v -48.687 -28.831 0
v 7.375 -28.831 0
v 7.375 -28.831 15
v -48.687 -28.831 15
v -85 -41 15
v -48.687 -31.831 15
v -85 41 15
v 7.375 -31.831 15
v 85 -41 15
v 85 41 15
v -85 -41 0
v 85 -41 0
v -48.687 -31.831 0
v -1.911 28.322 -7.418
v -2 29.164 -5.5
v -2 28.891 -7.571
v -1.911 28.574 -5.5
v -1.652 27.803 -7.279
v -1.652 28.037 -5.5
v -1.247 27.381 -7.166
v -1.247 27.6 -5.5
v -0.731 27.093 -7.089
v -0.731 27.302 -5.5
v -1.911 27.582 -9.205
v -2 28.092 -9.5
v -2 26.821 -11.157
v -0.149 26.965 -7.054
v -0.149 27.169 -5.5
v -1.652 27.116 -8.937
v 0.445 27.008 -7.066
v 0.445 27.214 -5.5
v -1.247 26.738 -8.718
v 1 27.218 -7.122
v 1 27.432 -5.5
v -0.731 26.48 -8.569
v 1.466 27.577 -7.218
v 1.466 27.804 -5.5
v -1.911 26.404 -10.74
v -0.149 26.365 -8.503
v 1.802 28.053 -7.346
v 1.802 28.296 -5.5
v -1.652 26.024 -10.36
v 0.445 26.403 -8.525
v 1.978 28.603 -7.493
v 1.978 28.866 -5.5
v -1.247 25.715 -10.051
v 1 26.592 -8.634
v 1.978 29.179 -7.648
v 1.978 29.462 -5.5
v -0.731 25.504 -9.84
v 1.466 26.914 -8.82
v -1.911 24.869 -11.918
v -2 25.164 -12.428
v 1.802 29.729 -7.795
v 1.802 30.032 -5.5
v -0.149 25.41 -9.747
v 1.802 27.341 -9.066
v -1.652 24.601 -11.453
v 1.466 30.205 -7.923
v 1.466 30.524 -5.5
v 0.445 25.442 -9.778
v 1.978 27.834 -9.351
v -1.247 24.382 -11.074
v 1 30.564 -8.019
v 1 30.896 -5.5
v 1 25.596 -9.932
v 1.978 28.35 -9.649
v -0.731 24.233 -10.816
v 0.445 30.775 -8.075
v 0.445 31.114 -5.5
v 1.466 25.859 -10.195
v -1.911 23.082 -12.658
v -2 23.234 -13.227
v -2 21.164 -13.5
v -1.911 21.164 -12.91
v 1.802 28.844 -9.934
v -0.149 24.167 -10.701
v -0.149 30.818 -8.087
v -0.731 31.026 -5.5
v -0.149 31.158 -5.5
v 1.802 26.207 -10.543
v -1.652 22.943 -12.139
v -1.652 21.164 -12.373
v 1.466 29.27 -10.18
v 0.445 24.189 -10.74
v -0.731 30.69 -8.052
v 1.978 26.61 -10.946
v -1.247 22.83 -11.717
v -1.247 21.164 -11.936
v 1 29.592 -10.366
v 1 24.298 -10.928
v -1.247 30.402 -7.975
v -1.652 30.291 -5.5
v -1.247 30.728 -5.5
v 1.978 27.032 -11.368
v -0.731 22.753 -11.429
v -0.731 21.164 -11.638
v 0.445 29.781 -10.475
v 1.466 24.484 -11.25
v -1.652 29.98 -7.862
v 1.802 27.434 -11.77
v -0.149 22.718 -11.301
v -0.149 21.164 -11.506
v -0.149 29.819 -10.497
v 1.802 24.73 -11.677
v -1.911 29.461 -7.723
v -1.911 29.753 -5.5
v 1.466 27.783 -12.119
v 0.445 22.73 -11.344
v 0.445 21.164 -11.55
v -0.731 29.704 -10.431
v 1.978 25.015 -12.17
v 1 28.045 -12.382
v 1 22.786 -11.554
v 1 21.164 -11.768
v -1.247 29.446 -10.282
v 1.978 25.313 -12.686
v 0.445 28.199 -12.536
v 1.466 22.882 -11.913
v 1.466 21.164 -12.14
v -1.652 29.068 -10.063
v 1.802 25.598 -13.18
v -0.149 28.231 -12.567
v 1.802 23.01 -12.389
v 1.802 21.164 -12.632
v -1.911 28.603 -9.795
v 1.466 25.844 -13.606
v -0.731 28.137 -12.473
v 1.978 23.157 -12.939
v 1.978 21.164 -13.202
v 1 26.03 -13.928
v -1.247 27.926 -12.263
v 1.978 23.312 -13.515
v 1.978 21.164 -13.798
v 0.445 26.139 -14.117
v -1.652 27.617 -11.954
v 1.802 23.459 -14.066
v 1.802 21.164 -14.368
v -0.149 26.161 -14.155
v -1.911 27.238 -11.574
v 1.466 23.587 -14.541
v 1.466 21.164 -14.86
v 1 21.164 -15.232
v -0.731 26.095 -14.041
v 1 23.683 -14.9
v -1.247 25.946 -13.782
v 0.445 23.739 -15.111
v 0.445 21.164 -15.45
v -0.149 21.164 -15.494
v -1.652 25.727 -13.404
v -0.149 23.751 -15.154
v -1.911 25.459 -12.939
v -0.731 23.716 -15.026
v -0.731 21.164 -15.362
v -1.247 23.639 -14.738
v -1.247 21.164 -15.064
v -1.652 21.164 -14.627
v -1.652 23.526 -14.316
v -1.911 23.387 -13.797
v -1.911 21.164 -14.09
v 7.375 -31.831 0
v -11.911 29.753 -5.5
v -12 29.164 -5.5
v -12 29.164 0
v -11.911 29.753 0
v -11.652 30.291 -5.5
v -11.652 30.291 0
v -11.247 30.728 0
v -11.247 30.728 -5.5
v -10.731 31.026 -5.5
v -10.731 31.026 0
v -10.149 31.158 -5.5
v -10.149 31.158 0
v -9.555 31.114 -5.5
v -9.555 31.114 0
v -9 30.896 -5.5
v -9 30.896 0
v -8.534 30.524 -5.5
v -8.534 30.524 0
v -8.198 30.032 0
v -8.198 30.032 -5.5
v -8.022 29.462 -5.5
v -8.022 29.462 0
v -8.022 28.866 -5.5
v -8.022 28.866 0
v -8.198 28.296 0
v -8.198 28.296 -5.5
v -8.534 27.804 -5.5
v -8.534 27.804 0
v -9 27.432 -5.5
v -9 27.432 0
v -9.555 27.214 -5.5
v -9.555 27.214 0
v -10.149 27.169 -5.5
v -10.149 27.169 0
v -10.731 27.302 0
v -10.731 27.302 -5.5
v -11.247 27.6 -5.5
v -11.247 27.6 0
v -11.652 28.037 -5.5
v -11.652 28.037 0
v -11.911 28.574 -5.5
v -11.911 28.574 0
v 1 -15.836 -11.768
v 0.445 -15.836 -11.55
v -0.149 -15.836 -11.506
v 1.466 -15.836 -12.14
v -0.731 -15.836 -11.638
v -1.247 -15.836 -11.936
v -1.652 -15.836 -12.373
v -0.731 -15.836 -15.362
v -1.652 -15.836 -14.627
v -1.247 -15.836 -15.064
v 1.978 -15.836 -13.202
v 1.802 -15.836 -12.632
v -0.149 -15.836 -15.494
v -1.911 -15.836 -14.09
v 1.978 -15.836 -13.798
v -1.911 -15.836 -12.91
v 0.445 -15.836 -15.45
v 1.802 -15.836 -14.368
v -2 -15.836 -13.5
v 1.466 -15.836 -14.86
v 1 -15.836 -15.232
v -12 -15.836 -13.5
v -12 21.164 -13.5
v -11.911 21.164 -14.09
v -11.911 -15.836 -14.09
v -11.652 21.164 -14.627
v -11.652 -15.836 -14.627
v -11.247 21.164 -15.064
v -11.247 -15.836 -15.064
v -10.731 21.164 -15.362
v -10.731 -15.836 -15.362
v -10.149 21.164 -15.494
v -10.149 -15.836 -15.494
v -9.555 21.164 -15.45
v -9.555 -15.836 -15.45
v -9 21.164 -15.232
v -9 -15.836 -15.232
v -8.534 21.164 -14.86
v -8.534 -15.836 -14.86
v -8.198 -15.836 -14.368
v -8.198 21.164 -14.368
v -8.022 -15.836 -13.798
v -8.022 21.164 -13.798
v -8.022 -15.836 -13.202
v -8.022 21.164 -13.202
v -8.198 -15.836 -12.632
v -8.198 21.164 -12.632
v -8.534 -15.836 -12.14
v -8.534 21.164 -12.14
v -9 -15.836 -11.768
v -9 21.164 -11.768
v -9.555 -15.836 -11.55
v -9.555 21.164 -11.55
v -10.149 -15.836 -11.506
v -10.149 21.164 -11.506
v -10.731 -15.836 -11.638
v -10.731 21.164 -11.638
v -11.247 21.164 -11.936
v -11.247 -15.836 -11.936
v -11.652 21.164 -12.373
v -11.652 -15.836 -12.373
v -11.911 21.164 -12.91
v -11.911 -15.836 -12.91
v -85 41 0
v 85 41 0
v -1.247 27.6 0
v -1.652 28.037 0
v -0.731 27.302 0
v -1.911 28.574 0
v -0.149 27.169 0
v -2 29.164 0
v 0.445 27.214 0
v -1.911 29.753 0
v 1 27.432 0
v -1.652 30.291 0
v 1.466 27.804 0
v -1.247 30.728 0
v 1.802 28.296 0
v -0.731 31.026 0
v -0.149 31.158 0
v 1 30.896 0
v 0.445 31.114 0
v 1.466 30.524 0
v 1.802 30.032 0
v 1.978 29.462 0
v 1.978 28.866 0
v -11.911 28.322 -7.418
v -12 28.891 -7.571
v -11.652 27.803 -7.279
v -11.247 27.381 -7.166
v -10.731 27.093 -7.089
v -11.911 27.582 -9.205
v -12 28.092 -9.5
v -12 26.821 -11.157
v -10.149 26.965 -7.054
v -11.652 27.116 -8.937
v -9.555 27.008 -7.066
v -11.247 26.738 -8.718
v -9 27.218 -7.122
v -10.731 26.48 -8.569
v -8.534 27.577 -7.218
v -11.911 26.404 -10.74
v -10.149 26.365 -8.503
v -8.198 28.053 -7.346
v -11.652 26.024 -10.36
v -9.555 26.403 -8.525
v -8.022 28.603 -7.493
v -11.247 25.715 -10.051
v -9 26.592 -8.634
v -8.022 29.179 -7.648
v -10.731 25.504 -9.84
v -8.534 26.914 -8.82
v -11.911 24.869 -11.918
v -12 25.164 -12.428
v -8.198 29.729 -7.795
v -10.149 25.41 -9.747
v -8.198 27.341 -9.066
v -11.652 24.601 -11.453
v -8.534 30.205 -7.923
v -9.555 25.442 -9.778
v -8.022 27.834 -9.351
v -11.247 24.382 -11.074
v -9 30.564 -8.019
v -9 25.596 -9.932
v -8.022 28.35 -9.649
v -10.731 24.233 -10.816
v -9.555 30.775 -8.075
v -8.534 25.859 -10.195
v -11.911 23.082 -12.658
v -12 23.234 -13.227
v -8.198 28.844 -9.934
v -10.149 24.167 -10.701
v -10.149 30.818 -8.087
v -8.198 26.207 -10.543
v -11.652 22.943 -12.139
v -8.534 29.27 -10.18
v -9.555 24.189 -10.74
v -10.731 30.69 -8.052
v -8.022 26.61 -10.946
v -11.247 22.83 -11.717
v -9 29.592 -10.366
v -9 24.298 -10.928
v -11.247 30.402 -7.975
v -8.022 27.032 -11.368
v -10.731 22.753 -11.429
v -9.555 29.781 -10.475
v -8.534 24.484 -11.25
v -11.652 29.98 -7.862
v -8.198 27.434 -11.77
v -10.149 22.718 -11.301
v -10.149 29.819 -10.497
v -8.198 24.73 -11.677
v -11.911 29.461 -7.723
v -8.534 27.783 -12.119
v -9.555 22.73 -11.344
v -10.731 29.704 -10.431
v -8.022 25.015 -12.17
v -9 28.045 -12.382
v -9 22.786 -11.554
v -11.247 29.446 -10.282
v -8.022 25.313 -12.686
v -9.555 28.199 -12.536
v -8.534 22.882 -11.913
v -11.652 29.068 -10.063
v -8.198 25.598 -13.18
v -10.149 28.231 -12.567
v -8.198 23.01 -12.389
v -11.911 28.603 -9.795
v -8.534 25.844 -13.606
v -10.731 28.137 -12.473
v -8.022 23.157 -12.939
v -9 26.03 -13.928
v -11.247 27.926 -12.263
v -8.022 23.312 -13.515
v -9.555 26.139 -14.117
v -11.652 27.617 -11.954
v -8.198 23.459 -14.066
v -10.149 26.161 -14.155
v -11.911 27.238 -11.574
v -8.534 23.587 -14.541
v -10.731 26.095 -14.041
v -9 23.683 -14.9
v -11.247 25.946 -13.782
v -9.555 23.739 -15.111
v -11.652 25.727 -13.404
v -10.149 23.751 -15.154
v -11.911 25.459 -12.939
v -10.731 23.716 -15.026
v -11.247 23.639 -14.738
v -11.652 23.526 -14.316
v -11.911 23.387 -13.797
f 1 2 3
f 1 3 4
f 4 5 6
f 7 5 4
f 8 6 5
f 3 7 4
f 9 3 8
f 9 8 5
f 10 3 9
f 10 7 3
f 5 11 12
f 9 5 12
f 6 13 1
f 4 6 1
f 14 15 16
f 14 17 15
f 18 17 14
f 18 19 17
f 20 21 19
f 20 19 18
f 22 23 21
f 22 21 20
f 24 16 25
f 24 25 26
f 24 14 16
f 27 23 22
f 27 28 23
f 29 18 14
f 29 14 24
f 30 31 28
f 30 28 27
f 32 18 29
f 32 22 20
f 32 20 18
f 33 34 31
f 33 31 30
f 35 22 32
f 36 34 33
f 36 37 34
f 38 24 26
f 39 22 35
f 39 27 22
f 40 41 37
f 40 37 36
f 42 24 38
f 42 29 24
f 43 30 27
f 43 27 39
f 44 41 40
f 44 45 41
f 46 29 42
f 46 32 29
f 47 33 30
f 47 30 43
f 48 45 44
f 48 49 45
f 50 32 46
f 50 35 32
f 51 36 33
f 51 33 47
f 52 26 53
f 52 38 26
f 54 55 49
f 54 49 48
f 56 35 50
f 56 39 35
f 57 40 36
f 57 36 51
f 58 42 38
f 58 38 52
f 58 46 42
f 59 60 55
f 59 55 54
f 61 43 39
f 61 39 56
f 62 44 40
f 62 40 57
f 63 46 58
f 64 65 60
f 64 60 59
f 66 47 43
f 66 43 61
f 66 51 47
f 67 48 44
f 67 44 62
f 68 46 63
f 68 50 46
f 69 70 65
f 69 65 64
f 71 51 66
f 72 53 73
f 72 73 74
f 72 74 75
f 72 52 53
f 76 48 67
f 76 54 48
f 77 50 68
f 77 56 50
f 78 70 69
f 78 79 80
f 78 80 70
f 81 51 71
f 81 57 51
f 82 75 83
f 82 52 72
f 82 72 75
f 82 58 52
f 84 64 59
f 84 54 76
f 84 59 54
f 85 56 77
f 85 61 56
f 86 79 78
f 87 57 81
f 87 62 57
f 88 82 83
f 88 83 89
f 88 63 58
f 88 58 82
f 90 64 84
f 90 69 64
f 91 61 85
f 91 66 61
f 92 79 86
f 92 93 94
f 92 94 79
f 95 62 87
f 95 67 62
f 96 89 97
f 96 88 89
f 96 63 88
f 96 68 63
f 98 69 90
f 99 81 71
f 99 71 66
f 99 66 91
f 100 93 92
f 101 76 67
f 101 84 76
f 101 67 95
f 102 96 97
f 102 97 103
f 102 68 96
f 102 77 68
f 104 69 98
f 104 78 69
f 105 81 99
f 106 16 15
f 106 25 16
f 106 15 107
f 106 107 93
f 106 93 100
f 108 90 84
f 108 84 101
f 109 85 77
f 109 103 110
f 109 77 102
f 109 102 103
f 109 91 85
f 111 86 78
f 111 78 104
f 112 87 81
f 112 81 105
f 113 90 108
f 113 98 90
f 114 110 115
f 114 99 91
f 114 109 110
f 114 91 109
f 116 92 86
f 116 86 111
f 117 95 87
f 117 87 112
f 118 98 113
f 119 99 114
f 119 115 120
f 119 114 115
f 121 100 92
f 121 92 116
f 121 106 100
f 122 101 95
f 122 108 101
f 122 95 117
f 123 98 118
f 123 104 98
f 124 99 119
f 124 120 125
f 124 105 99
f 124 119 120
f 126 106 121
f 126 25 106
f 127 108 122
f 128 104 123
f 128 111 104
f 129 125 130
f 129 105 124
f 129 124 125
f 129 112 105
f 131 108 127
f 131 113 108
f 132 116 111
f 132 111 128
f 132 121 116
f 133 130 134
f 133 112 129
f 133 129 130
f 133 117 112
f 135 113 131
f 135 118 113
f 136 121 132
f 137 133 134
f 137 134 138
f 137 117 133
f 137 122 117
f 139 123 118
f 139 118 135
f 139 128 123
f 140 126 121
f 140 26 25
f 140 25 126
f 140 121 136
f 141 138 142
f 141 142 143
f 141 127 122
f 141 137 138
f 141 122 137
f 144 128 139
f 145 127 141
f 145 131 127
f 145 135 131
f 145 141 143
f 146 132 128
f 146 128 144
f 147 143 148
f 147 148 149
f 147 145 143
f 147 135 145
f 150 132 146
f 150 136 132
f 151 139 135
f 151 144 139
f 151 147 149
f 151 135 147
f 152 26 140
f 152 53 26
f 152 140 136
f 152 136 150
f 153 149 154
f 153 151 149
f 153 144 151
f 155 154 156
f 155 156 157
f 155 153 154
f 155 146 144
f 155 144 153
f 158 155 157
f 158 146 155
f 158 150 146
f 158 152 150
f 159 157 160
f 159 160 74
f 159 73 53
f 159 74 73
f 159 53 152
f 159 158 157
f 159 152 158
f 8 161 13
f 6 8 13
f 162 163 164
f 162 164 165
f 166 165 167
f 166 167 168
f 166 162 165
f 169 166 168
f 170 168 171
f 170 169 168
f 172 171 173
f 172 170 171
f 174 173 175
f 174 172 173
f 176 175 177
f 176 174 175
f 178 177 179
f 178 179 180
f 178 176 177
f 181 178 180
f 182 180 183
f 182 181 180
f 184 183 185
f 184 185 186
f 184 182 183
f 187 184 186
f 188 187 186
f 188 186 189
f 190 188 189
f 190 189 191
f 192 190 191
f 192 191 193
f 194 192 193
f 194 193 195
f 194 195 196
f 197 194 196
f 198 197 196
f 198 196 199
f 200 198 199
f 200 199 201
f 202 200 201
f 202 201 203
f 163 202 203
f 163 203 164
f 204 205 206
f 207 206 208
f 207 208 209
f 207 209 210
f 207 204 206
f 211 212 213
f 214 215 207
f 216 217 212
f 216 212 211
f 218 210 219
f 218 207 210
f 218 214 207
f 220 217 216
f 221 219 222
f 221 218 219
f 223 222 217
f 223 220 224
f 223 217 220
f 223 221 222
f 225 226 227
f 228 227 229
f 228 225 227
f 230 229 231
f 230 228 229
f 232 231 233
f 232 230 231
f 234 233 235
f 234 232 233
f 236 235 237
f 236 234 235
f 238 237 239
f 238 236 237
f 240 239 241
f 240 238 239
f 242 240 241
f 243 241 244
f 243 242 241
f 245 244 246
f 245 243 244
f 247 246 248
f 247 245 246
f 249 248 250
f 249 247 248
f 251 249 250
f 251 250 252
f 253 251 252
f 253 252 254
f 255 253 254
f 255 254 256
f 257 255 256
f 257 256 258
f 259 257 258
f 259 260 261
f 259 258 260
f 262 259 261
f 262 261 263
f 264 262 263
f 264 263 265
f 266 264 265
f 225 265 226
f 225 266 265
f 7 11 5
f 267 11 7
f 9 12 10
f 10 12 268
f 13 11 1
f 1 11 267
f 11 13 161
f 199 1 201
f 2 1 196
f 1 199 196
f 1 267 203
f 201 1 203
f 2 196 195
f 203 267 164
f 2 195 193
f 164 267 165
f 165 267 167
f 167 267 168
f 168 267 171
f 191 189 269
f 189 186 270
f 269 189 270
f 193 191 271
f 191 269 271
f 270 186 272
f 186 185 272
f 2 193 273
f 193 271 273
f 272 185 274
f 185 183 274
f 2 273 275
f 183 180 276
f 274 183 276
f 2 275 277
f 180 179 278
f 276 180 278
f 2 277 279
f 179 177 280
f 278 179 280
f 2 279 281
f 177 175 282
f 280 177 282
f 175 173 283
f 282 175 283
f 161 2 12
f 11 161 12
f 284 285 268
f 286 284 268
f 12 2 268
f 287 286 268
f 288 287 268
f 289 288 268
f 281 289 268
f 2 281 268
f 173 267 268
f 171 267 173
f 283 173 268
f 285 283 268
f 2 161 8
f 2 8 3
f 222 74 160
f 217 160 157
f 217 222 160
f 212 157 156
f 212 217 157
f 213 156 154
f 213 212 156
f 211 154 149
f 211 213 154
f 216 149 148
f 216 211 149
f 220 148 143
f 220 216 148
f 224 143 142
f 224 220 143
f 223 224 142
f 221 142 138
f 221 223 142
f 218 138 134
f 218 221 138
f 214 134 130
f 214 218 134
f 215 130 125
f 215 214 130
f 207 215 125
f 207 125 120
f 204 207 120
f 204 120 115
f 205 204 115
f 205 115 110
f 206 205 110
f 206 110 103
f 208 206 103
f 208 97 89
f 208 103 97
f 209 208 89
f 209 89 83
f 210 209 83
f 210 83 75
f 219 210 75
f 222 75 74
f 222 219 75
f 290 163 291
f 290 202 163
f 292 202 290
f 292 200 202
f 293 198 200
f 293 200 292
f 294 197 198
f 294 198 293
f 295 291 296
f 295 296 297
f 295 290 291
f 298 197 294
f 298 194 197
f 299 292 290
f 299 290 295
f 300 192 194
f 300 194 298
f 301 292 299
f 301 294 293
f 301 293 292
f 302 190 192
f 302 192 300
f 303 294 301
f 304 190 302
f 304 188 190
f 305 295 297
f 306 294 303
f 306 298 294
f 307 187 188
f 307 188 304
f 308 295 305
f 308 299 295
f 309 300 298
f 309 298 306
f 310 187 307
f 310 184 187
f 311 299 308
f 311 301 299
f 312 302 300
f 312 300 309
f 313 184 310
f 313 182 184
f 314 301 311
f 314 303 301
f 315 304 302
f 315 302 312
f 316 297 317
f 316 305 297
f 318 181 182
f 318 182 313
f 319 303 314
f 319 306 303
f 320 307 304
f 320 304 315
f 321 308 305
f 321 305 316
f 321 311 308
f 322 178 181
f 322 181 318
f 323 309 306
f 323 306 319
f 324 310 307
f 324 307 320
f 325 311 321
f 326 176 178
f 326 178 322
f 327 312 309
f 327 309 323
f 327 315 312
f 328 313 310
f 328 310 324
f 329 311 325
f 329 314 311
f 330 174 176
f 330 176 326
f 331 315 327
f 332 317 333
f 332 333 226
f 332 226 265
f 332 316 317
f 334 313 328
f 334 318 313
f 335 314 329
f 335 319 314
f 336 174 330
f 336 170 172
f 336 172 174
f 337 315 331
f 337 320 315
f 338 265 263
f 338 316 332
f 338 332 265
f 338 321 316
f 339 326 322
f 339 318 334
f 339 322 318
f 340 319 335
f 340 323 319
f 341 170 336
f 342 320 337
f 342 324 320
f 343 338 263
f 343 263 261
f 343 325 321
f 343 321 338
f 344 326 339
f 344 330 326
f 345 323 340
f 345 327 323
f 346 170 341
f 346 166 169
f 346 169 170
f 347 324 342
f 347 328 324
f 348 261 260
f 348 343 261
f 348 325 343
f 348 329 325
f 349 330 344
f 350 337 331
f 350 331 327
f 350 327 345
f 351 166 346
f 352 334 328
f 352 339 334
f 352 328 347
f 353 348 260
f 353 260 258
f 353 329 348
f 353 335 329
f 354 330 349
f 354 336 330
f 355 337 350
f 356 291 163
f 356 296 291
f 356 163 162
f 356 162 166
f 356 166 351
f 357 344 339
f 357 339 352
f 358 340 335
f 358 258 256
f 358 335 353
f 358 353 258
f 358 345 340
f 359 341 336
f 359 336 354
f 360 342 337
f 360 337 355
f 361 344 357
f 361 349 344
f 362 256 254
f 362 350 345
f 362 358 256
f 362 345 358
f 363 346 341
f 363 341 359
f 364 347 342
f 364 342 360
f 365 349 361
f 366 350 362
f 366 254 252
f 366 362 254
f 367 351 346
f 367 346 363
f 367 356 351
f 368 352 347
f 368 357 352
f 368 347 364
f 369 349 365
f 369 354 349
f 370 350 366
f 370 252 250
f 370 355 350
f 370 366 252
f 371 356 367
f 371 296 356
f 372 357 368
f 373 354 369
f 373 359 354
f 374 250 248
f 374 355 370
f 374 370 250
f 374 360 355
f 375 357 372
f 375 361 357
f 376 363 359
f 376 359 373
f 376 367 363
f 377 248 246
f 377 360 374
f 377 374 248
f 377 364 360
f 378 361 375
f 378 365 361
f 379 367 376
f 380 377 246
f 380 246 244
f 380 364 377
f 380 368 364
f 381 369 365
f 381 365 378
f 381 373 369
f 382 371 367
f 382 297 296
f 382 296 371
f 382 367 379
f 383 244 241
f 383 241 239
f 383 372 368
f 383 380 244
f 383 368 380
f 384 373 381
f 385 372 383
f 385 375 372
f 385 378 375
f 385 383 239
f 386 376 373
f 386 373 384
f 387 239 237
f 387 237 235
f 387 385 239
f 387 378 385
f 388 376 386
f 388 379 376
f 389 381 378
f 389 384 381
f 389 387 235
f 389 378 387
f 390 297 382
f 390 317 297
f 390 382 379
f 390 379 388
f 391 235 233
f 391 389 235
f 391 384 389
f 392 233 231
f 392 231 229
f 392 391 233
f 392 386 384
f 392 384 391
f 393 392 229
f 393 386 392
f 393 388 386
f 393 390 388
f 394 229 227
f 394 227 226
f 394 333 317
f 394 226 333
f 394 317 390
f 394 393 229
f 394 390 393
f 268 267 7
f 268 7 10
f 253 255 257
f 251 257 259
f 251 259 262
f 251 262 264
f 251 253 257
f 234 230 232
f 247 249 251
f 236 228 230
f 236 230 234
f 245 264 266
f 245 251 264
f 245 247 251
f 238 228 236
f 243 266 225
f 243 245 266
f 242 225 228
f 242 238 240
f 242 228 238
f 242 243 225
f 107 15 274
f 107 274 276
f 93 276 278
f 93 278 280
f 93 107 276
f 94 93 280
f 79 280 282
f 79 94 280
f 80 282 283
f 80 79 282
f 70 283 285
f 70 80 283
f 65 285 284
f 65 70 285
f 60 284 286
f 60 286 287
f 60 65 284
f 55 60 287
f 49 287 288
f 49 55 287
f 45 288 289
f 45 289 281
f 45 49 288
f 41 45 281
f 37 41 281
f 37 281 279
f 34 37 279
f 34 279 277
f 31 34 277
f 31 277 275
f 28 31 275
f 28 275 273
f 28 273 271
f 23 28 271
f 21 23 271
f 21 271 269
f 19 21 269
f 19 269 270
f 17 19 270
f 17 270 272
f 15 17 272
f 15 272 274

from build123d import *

# Parameters (mm, degrees)
SKETCH2_W           = 170
SKETCH2_H           = 82
BOSS_EXTRUDE1_DEPTH = 15
SKETCH6_R           = 2
SKETCH7_W           = 56.062084811
SKETCH7_H           = 3
CUT_EXTRUDE2_DEPTH  = 96.636028792
LPATTERN1_COUNT     = 2
LPATTERN1_PITCH     = 10


with BuildPart() as part:
    # Sketch2 → Boss-Extrude1 (new body)
    with BuildSketch(Plane.XY):
        Rectangle(SKETCH2_W, SKETCH2_H)
    extrude(amount=BOSS_EXTRUDE1_DEPTH)

    # Sweep1: sweep along a path in Sketch5
    with BuildLine(Plane(origin=(0, 0, 0), x_dir=(0, 0, -1), z_dir=(1, 0, 0))) as sweep1_path:
        Line((0, 29.163871958), (5.5, 29.163871958))
        ThreePointArc((5.5, 29.163871958), (11.156854249, 26.820726208), (13.5, 21.163871958))
        Line((13.5, 21.163871958), (13.5, -15.836128042))
    # Sketch6 → Sweep1 (sweep)
    with BuildSketch(Plane(origin=(0, 0, 0), x_dir=(-1, 0, 0), z_dir=(0, 0, -1))):
        with Locations((0, 29.163871958)):
            Circle(SKETCH6_R)
    sweep1 = sweep(path=sweep1_path.line)

    # Sketch7 → Cut-Extrude2 (cut, through all)
    with BuildSketch(Plane(origin=(0, 0, 0), x_dir=(-1, 0, 0), z_dir=(0, 0, -1))):
        with Locations((20.655822978, -30.33067124)):
            Rectangle(SKETCH7_W, SKETCH7_H)
    extrude(amount=-CUT_EXTRUDE2_DEPTH, mode=Mode.SUBTRACT)

    # LPattern1: Sweep1 ×2
    with Locations(*[(-i * LPATTERN1_PITCH, 0, 0) for i in range(1, LPATTERN1_COUNT)]):
        add(sweep1)


solid = part.part
